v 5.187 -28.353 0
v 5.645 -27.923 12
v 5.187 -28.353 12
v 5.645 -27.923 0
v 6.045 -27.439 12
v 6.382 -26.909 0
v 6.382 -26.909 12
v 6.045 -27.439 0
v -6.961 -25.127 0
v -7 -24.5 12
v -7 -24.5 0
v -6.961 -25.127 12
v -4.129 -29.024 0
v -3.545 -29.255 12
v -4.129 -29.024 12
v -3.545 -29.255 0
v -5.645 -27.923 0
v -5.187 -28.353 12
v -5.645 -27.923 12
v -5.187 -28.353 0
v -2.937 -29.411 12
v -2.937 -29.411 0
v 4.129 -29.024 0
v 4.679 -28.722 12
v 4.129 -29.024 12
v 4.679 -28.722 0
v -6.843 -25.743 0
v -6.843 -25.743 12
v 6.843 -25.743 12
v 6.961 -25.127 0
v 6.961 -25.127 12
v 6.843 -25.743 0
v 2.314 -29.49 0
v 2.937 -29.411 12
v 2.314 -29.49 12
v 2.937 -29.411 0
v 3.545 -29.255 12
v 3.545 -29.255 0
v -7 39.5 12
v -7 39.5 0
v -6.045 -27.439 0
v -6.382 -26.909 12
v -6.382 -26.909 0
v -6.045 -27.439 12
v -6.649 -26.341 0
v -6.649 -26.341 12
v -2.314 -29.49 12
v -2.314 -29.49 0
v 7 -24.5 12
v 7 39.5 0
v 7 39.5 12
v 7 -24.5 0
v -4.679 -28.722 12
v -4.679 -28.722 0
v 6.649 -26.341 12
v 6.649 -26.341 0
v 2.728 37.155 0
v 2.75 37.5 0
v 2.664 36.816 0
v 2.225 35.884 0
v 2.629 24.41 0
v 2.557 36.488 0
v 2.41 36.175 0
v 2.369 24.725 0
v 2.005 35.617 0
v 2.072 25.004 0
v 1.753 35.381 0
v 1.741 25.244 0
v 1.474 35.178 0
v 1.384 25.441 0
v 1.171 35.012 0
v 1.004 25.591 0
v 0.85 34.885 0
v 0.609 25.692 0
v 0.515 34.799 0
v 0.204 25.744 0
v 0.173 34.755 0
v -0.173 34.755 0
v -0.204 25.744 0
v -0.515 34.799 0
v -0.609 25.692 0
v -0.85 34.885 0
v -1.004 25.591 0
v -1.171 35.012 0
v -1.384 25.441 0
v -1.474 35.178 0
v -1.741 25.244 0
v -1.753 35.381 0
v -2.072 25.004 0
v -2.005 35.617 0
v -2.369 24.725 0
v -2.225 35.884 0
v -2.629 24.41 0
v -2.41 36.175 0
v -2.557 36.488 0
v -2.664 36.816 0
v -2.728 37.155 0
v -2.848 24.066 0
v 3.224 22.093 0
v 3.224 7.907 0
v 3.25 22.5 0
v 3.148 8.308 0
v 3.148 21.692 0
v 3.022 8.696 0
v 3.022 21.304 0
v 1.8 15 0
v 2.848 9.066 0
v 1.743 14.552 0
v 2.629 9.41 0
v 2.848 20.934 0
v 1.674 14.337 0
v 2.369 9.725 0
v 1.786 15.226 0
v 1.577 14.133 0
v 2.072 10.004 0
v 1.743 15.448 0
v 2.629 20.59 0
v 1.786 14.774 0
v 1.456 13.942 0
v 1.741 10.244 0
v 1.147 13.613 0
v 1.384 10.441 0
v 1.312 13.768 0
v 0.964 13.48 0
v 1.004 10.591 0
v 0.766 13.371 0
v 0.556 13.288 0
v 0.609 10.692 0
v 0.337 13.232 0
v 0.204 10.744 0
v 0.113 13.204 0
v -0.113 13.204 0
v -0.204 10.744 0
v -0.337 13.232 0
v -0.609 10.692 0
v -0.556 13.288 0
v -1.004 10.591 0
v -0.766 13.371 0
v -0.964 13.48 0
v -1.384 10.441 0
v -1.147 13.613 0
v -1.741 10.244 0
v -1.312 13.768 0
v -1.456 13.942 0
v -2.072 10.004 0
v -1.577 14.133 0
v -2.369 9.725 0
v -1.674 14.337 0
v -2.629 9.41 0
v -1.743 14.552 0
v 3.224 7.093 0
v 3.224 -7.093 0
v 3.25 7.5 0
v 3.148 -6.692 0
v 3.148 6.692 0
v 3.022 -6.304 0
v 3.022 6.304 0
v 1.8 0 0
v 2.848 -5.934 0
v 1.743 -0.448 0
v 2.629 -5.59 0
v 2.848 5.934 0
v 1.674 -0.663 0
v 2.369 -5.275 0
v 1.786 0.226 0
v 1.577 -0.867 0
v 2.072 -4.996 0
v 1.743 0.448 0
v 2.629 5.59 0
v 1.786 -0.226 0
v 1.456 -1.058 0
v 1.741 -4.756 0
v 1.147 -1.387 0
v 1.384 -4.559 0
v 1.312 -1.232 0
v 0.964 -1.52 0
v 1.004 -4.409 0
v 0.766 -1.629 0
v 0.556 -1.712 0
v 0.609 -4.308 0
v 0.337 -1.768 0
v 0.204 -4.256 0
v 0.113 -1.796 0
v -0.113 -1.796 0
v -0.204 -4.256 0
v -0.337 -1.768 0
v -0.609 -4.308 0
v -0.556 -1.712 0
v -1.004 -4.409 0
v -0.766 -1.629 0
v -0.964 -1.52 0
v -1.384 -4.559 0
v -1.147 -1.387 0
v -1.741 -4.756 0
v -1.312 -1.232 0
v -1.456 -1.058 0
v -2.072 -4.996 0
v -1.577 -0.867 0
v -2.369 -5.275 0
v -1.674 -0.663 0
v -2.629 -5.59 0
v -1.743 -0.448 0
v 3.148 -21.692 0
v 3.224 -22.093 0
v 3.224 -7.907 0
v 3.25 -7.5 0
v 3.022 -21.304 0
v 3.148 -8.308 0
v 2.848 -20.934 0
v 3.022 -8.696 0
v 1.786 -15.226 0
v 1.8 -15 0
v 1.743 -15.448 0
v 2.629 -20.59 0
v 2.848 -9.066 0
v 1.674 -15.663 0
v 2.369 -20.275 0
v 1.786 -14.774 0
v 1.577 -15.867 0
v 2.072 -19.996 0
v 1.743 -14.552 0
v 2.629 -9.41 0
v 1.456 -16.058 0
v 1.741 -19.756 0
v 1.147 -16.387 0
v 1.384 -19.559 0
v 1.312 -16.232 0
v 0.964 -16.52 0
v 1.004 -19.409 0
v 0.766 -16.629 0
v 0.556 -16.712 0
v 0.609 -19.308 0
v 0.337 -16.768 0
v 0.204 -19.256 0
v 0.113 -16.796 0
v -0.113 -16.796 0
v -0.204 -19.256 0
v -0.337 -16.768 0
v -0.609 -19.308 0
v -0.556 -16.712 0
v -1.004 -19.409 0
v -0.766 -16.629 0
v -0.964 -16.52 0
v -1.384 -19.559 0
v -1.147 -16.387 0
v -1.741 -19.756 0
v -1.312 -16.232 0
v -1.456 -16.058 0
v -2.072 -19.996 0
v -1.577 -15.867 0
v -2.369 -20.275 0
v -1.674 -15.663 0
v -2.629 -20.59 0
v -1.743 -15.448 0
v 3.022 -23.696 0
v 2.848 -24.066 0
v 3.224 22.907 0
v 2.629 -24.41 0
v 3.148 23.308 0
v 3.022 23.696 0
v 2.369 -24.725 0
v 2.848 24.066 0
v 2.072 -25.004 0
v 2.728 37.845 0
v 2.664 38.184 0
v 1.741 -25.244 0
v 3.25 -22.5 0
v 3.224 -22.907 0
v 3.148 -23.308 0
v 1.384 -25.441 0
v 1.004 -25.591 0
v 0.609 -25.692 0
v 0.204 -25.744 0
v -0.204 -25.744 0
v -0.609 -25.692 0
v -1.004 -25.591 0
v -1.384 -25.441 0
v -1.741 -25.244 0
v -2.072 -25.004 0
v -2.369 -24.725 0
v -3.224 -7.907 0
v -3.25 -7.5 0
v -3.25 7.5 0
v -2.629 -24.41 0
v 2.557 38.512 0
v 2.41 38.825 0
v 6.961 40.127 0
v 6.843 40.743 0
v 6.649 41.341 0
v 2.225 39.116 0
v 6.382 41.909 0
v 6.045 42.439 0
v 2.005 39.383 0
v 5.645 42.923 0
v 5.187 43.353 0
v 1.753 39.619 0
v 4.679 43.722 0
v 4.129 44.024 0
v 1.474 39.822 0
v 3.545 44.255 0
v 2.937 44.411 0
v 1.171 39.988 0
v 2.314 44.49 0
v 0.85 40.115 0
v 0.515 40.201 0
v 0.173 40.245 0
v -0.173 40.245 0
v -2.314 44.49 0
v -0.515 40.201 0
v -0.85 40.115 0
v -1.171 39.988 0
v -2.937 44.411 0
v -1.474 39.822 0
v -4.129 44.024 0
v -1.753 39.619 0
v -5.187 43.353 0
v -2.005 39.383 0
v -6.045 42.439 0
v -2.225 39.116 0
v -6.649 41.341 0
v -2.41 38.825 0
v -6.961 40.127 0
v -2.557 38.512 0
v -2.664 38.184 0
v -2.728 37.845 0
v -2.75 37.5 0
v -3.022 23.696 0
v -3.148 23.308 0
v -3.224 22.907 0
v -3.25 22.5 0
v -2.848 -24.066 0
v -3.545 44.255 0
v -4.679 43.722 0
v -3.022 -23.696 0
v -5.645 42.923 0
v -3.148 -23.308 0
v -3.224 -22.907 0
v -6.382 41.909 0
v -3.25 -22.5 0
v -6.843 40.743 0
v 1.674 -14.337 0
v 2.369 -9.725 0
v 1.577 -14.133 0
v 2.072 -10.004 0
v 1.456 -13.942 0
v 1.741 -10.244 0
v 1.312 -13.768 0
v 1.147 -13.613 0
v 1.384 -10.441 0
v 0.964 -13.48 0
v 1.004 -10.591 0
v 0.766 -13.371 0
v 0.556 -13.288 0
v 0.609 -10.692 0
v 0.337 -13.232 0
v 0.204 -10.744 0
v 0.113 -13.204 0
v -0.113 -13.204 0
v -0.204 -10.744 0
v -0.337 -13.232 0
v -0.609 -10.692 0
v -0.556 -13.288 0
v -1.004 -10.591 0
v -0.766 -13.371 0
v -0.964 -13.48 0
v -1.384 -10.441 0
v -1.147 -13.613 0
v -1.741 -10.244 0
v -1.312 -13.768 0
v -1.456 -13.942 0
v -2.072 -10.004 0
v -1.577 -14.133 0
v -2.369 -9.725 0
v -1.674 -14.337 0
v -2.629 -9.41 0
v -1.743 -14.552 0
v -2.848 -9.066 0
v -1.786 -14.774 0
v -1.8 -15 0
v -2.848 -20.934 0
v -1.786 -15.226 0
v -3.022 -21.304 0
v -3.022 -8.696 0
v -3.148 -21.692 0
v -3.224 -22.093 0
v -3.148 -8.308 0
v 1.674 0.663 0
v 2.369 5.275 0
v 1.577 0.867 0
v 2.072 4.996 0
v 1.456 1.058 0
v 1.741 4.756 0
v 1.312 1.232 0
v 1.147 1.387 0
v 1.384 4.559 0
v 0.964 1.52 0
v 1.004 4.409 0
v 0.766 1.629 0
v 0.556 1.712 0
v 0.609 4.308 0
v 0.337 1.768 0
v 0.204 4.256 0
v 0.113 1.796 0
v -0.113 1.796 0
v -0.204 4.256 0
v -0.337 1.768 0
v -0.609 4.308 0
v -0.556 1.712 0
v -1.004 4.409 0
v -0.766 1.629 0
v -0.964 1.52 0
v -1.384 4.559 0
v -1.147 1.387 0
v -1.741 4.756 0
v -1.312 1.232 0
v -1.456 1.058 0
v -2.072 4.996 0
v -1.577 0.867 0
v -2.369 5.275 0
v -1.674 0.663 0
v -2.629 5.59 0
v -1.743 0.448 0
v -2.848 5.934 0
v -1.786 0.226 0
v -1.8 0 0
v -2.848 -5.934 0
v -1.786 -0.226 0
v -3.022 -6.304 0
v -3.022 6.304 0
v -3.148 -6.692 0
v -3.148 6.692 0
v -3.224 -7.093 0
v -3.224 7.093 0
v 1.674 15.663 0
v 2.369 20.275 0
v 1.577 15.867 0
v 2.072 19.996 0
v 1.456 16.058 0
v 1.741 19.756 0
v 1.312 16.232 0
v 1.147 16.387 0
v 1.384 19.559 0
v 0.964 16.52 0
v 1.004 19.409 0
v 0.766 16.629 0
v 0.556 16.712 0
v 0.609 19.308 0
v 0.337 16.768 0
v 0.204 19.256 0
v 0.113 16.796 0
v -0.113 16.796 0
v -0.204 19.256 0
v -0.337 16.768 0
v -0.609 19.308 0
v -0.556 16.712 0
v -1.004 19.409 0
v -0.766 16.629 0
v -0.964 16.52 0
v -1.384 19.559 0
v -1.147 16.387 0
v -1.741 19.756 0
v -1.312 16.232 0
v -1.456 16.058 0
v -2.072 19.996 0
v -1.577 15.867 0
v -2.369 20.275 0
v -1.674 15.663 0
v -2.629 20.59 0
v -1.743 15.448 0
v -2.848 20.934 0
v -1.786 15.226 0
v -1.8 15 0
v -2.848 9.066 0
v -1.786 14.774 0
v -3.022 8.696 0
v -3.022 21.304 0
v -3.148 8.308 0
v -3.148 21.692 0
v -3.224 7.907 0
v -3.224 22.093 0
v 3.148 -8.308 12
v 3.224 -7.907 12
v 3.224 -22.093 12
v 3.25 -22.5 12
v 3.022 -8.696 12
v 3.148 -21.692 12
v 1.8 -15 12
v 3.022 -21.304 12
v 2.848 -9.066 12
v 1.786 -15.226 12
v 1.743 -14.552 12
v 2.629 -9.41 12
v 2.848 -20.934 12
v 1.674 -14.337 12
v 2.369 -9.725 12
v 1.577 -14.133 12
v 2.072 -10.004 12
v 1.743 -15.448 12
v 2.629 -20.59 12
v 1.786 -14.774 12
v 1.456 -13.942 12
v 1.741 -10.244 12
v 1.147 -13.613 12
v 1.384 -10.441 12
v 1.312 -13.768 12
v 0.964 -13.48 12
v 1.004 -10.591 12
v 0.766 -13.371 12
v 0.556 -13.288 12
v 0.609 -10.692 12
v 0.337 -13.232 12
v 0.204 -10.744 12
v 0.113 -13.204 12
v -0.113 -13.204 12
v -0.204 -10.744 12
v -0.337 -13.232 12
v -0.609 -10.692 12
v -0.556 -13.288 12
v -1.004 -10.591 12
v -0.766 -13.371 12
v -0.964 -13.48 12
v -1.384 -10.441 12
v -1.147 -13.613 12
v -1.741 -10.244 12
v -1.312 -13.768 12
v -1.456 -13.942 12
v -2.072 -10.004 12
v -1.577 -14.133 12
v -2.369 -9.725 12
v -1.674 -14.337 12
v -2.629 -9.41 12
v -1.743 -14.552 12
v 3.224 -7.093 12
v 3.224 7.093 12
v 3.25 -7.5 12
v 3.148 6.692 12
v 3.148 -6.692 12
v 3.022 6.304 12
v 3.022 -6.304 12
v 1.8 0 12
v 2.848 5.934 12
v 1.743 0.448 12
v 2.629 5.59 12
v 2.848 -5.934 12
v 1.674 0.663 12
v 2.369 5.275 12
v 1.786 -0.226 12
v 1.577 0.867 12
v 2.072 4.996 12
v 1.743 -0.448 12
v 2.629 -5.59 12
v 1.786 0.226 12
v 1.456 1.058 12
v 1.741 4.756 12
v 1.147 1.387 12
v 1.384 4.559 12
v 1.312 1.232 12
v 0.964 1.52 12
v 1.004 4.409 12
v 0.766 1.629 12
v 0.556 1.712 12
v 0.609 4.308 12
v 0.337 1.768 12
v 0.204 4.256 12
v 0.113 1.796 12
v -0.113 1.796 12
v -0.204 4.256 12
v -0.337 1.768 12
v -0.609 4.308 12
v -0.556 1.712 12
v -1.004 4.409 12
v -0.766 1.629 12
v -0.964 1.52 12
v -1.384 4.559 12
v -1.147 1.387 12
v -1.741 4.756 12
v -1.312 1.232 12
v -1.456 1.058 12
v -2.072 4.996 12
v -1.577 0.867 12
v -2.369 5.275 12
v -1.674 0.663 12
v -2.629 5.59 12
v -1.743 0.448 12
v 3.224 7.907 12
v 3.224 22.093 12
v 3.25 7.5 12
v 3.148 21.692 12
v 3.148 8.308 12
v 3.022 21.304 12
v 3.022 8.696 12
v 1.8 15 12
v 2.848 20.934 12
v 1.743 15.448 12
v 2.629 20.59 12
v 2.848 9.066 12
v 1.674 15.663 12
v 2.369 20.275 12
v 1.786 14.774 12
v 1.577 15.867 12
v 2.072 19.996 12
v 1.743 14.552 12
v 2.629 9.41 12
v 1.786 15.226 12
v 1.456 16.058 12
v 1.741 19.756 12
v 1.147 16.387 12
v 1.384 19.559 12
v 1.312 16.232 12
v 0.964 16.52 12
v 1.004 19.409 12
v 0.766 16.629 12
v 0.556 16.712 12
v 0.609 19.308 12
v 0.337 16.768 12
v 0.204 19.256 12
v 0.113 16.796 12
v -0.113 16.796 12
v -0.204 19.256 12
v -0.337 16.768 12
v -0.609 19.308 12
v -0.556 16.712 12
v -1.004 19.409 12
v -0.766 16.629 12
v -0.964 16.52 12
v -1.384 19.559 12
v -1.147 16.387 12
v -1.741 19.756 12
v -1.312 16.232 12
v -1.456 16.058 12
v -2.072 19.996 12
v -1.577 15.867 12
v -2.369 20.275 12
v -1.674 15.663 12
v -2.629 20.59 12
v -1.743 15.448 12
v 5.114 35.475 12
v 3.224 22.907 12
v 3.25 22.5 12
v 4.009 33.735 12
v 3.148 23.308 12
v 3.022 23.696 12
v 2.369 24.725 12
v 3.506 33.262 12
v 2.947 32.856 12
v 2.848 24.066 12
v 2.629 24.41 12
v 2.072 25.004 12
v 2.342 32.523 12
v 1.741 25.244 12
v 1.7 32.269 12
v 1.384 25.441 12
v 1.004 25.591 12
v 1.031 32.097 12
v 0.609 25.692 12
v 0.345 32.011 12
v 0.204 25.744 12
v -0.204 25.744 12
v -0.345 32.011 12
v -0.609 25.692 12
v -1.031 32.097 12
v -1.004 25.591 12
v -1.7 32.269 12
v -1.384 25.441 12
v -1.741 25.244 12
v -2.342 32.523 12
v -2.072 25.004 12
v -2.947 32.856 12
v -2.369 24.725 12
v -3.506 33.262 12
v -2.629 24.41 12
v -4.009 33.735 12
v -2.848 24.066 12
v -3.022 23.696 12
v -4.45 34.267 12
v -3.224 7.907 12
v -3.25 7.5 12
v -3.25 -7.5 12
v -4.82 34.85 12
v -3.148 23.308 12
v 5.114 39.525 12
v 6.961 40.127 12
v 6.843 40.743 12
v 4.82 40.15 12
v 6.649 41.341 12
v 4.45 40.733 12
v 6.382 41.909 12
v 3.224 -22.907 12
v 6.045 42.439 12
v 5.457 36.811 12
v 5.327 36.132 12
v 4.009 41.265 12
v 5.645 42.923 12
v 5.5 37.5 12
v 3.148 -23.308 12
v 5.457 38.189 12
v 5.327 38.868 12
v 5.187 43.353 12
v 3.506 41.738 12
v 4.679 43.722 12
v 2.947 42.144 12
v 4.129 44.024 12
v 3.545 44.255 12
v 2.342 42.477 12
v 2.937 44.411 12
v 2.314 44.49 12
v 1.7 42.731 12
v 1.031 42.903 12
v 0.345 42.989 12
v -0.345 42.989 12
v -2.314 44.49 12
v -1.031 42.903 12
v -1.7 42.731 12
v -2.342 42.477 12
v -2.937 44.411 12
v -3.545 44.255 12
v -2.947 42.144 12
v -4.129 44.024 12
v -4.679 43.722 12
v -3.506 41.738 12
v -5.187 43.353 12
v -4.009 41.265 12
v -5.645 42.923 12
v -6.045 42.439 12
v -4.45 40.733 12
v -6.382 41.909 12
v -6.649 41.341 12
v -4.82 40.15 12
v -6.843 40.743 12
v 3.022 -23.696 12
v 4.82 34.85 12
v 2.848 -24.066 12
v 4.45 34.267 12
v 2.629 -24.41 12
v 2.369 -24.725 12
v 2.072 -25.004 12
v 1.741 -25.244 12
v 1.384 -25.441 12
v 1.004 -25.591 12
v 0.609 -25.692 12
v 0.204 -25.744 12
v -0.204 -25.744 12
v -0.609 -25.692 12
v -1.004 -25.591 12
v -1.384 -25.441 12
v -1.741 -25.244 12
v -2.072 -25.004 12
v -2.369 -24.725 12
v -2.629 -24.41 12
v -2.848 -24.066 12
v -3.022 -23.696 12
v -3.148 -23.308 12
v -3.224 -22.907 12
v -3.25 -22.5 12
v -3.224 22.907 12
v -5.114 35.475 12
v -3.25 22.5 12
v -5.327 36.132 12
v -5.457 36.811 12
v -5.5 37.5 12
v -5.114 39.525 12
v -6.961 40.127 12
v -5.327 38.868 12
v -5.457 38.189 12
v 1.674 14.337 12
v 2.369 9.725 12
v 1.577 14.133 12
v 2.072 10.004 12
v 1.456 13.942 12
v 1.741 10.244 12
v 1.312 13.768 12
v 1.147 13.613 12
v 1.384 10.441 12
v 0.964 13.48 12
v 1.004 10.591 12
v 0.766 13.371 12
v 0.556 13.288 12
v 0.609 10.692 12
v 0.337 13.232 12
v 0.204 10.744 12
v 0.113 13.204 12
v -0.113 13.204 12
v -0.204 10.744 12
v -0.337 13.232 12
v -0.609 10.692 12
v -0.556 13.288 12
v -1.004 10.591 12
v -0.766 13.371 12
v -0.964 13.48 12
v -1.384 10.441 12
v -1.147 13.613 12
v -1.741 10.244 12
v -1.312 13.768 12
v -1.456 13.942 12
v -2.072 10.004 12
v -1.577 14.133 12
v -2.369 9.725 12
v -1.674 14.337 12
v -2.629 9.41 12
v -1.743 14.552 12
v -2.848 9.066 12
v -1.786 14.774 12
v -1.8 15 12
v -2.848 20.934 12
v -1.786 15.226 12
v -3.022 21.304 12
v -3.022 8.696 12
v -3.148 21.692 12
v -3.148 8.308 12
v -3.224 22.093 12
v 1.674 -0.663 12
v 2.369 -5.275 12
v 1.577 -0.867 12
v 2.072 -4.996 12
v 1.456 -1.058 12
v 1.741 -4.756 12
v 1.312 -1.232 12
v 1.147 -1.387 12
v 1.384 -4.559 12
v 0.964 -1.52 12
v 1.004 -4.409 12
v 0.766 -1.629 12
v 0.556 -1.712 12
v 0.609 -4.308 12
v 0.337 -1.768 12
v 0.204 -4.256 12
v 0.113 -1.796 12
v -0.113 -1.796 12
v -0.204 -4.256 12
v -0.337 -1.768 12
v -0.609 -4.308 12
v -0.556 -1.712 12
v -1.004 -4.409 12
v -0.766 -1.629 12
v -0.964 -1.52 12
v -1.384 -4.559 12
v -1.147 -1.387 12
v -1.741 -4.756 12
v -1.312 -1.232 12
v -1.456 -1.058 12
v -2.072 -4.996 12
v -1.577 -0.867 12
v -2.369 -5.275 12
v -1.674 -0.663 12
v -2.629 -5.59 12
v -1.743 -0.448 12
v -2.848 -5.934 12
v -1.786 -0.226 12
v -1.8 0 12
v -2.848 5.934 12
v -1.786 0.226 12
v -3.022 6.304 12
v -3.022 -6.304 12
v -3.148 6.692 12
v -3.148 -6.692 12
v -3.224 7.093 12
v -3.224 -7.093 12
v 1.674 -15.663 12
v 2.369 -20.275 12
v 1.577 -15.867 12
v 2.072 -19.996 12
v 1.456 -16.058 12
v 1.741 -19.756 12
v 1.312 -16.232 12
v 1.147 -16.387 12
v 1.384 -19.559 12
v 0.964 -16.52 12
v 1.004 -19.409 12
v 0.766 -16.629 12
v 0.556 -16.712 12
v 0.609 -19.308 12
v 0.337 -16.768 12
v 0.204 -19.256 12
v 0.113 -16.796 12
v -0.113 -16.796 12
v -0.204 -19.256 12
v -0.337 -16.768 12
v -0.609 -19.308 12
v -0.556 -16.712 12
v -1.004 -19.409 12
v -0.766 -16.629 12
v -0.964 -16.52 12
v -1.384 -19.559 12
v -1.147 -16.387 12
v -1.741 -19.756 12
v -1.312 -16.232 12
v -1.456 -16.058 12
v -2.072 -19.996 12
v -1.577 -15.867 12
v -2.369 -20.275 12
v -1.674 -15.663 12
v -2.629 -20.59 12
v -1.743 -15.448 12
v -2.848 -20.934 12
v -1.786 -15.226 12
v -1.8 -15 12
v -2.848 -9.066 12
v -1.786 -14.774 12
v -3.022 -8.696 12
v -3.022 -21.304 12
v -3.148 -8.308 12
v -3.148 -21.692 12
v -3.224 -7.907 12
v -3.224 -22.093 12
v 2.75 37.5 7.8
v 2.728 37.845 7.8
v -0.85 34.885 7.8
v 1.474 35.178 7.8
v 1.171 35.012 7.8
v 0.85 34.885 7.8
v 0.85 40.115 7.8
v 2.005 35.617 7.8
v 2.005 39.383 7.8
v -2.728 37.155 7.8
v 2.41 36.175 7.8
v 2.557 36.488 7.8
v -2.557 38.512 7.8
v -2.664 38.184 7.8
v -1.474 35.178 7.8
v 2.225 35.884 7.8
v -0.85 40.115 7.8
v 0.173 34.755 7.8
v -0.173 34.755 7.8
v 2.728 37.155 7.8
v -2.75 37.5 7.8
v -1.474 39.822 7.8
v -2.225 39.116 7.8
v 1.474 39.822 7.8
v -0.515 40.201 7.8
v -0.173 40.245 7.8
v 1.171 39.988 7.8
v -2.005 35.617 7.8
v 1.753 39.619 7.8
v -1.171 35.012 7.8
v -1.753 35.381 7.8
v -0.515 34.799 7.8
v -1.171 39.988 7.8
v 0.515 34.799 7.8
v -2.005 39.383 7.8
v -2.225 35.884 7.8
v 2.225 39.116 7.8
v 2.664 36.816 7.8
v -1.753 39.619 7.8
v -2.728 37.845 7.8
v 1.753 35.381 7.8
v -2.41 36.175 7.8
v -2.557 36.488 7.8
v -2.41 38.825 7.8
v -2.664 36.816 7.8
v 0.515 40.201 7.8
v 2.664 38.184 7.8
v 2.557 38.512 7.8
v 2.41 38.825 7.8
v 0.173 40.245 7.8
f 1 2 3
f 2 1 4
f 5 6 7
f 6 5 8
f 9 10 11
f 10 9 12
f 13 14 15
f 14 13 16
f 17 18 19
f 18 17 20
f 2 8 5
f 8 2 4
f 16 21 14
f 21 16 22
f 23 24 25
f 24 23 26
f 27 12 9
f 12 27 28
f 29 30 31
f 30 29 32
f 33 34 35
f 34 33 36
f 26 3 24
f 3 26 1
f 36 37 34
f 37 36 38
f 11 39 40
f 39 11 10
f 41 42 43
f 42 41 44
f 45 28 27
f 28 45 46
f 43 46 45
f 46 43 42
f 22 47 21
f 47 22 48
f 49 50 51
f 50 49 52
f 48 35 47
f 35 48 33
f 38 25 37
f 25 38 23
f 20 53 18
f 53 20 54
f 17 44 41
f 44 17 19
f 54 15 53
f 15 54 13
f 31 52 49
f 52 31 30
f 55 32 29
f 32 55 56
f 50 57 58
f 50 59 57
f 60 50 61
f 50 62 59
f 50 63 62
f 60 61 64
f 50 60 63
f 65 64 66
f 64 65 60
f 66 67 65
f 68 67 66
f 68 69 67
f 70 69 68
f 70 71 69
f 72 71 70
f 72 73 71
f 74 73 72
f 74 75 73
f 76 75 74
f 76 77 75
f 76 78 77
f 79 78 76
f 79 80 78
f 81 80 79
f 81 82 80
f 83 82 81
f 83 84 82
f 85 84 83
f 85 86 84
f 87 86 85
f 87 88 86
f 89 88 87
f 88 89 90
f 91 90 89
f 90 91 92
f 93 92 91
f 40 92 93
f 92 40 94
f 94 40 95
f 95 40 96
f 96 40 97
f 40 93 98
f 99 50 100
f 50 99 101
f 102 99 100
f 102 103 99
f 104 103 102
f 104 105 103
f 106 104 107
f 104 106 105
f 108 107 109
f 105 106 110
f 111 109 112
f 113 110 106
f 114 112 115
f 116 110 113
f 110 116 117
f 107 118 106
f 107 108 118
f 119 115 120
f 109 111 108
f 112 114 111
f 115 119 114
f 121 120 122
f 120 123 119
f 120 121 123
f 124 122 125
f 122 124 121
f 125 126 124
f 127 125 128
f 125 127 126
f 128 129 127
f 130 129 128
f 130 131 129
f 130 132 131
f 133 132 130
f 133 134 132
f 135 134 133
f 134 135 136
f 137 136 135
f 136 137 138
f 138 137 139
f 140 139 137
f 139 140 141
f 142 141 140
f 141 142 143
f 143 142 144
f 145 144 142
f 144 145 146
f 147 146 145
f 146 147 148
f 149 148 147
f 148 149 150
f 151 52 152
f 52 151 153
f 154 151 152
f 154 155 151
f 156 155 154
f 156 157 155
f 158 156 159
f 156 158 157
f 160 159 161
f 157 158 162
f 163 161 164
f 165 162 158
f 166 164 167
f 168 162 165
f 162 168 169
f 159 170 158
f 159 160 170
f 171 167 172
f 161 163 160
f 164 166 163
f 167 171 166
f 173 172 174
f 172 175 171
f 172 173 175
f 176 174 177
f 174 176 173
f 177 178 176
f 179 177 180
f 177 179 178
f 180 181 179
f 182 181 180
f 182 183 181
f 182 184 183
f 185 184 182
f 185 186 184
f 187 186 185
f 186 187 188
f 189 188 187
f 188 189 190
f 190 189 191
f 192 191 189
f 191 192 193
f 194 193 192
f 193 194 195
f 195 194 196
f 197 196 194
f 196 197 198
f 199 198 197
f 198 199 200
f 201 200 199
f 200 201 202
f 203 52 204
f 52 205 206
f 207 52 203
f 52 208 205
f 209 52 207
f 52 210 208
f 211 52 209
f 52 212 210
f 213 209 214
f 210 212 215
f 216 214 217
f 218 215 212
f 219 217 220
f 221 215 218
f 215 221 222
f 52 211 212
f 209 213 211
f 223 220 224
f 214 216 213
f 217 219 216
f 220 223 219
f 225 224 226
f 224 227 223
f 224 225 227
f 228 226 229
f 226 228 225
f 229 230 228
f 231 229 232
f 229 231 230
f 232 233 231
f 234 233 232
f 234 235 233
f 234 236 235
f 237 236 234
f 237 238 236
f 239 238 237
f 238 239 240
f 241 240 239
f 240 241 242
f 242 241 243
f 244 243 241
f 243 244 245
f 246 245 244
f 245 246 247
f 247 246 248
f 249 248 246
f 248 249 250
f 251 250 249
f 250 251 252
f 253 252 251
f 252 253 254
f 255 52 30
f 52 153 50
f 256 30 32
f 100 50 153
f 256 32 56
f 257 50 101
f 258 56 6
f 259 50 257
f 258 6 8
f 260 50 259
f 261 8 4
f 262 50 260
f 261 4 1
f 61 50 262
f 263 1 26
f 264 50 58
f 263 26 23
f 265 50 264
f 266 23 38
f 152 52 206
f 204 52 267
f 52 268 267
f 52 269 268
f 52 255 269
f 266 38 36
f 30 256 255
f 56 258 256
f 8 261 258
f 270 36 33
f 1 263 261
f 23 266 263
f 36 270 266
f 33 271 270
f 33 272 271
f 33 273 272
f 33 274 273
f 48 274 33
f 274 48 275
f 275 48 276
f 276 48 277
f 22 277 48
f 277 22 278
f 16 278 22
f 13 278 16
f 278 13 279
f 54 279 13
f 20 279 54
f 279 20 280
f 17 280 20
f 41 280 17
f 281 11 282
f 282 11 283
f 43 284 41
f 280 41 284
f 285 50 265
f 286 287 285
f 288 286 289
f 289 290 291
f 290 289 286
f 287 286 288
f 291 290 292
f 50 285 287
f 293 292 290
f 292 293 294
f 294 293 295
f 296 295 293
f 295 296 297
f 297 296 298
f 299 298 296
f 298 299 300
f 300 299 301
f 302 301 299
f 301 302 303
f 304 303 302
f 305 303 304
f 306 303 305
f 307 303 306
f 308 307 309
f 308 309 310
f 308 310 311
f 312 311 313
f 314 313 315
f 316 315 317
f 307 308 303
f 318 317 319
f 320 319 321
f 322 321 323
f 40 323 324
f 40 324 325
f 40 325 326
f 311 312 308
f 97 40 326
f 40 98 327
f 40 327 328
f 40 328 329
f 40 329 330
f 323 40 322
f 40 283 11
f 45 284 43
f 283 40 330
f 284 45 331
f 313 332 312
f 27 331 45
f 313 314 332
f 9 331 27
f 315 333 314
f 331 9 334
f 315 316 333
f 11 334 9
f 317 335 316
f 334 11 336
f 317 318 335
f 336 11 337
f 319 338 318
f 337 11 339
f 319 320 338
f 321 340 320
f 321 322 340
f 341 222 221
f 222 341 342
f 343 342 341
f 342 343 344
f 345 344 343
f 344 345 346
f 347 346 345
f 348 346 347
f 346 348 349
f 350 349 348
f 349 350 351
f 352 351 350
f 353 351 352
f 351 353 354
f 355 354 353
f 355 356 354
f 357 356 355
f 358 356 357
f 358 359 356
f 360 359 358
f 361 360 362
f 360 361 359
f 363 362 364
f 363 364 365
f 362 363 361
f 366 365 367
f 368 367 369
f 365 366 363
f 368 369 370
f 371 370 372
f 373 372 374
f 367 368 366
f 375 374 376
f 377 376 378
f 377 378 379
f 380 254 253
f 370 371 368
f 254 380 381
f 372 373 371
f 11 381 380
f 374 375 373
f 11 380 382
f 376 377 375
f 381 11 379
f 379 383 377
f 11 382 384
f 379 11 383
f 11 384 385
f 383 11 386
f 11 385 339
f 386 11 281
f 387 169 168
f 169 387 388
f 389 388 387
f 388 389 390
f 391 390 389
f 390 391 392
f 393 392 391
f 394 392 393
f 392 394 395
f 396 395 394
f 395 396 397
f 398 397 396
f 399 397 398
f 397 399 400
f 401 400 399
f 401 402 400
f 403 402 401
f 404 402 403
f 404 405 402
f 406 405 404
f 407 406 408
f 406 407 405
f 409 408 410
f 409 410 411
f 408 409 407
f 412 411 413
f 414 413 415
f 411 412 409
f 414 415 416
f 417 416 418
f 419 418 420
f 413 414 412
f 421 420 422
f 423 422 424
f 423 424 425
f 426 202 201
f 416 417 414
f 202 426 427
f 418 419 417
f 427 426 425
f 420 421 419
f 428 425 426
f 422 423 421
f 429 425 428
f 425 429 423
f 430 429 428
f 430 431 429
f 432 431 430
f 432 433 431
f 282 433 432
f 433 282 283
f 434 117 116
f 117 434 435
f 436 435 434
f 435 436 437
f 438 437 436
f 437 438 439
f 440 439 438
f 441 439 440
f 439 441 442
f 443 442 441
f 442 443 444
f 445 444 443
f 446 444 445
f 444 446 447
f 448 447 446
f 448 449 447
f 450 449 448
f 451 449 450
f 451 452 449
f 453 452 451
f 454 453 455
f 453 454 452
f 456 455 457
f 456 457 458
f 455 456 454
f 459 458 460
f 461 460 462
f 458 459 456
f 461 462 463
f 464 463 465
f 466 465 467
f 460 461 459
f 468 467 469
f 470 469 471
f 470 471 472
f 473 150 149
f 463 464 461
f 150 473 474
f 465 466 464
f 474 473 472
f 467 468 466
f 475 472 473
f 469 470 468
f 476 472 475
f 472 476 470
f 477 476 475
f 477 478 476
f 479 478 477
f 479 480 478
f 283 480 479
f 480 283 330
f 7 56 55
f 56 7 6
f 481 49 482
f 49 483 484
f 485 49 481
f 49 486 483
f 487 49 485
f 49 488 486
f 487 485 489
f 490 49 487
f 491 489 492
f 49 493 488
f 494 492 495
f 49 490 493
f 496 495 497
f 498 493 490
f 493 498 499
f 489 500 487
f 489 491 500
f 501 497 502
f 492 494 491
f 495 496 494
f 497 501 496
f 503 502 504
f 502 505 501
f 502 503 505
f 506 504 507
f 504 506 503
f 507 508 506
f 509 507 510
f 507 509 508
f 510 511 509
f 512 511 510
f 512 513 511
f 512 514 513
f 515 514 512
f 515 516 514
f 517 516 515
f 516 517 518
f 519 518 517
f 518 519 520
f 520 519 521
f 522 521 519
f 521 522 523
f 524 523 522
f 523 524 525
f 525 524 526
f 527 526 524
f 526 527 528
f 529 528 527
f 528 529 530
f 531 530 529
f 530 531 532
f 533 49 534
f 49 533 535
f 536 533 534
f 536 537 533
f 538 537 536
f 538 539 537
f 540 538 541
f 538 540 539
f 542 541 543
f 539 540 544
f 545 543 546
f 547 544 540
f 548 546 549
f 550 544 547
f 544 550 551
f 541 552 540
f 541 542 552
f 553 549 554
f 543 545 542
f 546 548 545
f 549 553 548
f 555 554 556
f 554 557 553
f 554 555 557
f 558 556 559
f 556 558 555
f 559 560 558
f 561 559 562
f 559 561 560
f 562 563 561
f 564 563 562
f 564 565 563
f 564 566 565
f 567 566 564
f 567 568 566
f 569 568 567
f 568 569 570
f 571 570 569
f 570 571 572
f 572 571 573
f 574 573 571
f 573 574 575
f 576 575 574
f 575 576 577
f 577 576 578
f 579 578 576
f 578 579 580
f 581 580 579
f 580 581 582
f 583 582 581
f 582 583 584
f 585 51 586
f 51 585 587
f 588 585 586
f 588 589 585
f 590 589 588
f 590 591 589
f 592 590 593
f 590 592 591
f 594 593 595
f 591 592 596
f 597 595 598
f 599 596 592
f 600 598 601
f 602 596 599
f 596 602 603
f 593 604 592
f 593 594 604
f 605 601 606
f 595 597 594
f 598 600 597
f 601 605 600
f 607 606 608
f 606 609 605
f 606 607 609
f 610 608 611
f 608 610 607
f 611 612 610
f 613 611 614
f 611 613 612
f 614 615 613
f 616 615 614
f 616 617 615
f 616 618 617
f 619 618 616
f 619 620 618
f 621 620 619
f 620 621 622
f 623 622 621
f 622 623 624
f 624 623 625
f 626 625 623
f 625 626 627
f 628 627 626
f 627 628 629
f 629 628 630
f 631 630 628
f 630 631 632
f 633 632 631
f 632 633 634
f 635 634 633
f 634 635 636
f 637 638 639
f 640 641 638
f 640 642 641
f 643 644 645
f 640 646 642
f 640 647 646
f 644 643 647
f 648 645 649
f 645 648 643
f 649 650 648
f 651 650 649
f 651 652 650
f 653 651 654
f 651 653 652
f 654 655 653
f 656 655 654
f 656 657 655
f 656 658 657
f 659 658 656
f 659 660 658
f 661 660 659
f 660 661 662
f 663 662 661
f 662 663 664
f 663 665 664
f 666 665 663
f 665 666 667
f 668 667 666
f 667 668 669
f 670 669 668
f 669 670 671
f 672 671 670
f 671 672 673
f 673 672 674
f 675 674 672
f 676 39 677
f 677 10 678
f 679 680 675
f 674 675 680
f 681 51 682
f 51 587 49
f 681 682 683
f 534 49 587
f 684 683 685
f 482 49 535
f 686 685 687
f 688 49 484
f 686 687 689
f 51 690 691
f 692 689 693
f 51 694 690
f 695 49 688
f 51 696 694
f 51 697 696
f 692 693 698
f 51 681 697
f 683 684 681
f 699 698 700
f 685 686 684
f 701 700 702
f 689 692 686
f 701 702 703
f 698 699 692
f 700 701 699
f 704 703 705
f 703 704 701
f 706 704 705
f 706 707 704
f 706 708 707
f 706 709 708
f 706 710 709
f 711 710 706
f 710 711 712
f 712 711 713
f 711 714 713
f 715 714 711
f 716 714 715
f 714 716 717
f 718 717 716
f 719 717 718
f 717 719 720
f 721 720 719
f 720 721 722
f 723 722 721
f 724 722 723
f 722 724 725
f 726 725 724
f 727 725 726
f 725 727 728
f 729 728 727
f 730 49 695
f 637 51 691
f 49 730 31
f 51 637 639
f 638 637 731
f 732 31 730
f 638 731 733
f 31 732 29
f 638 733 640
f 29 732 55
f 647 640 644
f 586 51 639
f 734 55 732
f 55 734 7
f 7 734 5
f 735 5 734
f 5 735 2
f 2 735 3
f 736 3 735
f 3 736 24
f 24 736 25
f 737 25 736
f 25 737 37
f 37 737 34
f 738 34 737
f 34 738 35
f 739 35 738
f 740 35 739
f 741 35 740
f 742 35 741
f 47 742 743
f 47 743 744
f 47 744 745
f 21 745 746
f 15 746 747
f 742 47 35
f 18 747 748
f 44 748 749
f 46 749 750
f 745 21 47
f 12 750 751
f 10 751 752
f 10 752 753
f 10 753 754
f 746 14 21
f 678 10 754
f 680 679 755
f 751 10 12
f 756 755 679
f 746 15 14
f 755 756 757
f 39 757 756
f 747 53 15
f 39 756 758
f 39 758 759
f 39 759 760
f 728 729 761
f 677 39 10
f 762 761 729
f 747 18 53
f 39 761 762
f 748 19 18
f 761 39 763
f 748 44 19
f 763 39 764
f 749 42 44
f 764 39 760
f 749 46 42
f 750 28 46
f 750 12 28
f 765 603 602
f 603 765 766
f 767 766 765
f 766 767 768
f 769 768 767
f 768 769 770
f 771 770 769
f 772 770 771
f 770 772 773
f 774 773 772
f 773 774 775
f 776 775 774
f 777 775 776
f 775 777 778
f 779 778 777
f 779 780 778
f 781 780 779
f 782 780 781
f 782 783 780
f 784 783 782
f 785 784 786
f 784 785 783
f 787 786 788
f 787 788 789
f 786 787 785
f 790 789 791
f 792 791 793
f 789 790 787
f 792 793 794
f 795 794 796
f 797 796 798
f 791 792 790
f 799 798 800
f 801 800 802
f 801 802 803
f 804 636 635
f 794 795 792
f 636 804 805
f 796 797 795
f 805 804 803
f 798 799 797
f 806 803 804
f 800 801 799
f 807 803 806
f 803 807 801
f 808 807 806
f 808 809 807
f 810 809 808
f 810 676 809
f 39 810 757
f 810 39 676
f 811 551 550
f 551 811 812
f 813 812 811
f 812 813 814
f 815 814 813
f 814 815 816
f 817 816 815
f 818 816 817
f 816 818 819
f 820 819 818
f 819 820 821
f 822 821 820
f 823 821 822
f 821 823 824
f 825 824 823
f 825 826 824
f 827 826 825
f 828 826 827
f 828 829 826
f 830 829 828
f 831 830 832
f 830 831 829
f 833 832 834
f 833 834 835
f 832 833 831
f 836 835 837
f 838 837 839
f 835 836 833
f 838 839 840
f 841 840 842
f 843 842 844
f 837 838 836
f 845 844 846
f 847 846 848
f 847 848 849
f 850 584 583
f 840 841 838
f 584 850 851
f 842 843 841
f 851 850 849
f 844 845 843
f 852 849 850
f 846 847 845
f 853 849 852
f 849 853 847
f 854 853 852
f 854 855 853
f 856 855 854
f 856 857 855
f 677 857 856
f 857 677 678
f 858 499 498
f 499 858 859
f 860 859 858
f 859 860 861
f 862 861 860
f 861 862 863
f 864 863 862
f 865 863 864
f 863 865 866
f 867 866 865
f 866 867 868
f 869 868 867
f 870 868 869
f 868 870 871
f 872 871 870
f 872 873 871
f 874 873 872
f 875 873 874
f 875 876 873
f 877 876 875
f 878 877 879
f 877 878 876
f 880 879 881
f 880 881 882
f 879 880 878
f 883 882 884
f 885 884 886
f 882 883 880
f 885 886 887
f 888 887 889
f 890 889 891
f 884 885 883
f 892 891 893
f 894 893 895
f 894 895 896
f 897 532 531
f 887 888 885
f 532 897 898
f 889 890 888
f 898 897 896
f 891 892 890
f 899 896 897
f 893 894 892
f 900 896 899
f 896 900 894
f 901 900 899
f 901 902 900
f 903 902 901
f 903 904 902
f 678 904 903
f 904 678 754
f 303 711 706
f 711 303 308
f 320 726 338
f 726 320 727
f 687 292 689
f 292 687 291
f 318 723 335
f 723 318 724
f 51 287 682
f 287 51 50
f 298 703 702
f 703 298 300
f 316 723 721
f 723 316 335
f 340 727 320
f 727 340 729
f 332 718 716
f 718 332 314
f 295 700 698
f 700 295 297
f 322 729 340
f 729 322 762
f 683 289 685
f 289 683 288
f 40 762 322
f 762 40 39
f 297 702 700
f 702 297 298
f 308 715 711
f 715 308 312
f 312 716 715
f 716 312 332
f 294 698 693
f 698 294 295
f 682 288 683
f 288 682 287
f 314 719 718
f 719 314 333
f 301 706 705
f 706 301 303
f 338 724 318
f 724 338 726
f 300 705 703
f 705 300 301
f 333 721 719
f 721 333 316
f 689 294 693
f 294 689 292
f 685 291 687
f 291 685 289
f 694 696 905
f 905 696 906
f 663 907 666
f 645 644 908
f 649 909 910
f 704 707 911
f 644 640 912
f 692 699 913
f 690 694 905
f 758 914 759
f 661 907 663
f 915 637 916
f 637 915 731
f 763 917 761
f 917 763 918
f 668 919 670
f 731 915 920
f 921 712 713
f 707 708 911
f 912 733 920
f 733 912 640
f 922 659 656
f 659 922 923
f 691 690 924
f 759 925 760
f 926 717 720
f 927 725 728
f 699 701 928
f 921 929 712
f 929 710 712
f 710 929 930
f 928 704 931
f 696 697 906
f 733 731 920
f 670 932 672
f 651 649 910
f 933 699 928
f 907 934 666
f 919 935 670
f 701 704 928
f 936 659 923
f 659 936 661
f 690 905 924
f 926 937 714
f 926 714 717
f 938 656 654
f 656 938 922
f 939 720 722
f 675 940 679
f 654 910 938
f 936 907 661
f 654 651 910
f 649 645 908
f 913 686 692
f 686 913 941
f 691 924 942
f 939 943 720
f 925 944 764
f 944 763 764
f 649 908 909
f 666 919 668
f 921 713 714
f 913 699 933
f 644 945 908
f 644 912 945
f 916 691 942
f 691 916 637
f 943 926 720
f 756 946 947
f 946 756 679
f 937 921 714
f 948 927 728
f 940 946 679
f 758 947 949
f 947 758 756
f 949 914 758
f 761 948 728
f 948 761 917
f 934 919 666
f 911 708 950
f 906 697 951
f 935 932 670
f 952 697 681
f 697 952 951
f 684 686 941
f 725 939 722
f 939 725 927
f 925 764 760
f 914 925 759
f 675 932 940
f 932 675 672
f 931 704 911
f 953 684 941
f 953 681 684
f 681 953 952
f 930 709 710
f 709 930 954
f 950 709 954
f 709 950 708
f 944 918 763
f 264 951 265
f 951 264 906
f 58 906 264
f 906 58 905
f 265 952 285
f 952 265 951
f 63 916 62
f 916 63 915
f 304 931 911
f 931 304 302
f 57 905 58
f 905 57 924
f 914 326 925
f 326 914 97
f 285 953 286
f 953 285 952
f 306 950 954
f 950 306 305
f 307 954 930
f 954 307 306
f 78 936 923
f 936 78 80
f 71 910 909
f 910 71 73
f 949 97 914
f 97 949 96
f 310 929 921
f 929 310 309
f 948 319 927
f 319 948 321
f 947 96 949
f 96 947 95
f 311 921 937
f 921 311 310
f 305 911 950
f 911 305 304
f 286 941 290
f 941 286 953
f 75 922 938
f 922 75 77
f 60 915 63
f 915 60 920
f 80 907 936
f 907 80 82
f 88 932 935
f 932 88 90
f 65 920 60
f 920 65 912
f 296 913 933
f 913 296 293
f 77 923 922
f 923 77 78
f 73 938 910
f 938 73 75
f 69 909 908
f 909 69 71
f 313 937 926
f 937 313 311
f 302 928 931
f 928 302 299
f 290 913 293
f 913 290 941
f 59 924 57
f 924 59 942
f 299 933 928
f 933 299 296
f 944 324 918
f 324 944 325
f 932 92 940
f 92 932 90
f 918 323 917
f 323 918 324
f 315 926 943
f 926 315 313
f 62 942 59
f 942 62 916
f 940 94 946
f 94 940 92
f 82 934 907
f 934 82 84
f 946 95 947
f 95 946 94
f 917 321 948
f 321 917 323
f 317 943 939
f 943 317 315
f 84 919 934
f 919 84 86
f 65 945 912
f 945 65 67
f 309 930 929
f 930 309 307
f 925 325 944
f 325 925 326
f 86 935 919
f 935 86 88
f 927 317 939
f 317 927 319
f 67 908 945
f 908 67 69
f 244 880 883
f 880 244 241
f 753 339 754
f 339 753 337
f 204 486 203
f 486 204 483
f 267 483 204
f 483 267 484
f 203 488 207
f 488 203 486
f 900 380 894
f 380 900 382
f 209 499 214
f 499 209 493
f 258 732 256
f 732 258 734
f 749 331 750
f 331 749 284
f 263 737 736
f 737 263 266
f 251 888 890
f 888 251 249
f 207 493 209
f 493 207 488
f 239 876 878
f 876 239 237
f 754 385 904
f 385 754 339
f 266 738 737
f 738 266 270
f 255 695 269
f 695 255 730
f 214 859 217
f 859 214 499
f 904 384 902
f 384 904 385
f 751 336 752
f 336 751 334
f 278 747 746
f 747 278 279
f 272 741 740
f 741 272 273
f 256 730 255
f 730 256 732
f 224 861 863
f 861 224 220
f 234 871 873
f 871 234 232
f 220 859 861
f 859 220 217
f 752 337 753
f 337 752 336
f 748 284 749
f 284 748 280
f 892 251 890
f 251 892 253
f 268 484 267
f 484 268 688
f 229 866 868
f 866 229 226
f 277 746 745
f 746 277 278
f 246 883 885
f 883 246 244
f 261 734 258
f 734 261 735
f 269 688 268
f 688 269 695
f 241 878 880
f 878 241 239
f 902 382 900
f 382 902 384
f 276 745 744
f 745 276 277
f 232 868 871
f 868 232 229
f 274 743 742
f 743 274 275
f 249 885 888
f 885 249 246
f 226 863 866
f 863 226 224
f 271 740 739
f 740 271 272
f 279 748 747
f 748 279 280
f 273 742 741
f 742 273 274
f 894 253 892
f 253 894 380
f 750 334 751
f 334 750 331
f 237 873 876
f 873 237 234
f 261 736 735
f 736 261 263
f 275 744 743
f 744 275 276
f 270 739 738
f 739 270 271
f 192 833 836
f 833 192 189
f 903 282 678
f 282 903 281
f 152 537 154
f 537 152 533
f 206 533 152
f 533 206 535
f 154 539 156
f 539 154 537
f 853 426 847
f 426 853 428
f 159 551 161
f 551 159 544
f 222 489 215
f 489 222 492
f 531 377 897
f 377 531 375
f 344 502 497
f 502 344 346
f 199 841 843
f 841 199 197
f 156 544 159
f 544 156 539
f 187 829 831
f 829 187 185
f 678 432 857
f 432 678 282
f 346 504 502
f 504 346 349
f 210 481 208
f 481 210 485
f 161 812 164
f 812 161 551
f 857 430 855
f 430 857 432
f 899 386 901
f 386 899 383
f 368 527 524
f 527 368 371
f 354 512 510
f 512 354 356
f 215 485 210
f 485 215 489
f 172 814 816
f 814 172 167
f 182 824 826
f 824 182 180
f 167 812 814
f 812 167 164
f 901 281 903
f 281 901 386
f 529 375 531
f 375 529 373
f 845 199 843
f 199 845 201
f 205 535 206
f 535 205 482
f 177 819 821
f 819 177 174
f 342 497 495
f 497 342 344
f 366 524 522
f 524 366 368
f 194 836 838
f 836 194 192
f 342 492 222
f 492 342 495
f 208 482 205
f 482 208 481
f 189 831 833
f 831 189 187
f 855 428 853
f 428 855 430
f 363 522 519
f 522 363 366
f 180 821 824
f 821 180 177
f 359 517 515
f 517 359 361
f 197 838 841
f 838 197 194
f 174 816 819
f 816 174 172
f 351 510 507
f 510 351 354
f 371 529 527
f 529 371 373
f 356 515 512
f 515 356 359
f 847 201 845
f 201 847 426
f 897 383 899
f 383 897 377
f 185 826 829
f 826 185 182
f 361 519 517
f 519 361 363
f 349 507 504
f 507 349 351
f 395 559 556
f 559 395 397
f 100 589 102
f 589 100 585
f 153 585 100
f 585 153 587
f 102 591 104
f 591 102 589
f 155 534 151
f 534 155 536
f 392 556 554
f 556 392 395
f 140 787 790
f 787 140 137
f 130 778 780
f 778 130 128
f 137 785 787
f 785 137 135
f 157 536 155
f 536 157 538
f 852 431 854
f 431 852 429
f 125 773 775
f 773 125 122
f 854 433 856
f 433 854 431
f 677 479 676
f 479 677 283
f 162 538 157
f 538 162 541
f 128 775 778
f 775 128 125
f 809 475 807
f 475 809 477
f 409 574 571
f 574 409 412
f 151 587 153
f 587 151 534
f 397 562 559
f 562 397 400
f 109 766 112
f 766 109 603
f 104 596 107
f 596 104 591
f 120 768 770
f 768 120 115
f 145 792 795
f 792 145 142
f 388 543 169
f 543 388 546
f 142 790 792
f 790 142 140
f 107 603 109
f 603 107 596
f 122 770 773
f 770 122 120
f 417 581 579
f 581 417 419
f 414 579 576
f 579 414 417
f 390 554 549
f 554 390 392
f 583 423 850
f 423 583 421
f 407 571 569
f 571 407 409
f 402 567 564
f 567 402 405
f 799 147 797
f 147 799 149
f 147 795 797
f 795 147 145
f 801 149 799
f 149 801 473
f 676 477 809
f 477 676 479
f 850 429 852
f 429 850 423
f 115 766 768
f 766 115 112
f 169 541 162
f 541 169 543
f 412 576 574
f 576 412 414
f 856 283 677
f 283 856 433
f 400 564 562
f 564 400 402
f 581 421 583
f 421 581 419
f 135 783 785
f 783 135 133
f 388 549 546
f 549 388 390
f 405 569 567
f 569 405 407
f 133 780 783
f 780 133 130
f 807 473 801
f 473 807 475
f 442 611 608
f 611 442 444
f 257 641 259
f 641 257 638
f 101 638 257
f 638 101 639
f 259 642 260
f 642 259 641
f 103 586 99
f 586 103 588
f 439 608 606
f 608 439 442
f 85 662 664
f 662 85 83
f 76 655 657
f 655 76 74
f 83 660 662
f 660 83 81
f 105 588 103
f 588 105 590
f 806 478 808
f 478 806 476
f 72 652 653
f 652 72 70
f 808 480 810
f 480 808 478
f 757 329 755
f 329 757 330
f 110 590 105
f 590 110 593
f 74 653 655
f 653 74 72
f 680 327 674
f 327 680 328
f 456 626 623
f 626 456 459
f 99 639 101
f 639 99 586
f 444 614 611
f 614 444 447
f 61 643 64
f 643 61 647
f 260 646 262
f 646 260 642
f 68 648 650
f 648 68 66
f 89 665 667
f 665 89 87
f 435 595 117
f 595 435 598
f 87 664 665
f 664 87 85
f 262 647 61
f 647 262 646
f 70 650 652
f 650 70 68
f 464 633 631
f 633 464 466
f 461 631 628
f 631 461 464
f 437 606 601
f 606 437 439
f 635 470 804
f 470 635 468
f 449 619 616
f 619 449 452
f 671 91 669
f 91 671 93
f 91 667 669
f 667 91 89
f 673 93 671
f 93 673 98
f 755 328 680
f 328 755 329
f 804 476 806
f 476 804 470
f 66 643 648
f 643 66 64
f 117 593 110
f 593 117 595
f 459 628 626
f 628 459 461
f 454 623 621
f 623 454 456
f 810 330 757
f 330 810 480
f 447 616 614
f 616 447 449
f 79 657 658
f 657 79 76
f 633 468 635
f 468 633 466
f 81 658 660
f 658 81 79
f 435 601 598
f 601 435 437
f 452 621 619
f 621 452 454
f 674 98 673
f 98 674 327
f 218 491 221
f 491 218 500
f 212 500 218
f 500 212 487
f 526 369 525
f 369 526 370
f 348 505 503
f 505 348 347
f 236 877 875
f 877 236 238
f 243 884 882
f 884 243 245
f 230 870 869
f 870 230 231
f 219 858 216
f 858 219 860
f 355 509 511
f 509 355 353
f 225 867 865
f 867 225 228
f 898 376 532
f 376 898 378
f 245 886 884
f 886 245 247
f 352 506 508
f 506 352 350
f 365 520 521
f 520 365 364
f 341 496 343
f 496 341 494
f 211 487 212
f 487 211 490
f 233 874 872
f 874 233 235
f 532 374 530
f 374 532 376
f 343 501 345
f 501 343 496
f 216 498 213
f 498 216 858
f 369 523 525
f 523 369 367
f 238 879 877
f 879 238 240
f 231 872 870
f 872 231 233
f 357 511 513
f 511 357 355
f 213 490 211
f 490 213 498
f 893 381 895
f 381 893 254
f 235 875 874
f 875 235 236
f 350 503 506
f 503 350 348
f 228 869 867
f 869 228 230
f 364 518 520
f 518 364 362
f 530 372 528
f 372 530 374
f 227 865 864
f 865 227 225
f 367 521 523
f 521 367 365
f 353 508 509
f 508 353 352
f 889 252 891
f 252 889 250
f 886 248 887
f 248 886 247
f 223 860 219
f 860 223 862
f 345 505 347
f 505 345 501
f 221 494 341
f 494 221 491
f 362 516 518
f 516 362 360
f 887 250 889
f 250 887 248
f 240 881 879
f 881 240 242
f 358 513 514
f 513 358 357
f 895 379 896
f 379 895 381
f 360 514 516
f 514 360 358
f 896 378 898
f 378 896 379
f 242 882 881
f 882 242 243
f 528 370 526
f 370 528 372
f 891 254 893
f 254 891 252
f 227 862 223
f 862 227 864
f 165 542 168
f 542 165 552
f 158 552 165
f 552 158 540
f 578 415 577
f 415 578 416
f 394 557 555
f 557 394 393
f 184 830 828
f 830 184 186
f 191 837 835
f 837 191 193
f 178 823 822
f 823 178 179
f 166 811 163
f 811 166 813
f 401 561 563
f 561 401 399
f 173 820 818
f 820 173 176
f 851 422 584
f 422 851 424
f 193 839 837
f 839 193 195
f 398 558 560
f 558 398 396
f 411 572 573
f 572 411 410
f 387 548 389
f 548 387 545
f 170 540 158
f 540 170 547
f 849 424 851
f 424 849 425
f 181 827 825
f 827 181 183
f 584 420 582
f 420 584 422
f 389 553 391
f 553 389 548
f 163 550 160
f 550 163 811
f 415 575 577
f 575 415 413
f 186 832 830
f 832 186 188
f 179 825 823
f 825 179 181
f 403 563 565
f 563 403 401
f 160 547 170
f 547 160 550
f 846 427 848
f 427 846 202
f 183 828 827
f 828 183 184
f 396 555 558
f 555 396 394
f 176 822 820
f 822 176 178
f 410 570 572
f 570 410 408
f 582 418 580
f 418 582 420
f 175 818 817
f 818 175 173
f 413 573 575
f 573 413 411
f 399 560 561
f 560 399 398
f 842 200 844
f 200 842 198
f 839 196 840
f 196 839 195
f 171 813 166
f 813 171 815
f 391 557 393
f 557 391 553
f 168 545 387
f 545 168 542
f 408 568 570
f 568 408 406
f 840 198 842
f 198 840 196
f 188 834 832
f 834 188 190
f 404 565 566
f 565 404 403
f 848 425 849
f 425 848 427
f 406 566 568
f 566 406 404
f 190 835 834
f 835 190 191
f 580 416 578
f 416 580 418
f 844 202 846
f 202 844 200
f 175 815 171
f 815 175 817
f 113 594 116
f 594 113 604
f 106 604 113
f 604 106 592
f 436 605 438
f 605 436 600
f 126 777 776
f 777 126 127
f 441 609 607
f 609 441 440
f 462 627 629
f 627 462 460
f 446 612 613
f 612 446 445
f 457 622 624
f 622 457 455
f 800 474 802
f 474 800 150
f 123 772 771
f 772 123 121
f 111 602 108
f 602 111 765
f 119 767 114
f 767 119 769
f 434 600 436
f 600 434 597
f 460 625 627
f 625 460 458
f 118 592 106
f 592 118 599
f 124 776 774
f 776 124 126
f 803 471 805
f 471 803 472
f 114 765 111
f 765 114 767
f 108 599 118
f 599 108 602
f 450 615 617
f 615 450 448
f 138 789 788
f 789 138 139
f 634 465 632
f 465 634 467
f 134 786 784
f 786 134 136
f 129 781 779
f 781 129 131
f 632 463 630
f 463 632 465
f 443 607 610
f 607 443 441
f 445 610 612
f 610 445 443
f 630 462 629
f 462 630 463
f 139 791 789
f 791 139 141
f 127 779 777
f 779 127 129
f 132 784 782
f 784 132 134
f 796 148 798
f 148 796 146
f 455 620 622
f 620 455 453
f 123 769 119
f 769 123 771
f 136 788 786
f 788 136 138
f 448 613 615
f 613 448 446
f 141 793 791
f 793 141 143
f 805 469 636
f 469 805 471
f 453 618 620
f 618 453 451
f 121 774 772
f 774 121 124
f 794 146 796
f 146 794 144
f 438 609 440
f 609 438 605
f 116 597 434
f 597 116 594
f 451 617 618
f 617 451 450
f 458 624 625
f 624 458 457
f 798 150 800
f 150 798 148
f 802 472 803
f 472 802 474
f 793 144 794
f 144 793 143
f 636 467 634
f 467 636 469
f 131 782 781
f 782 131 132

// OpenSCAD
$fn = 50;


difference() {
	union() {
		hull() {
			translate(v = [-2.0000000000, 24.5000000000, 0]) {
				cylinder(h = 12, r = 5);
			}
			translate(v = [2.0000000000, 24.5000000000, 0]) {
				cylinder(h = 12, r = 5);
			}
			translate(v = [-2.0000000000, -24.5000000000, 0]) {
				cylinder(h = 12, r = 5);
			}
			translate(v = [2.0000000000, -24.5000000000, 0]) {
				cylinder(h = 12, r = 5);
			}
		}
		translate(v = [0.0000000000, 30.0000000000, 0]) {
			hull() {
				translate(v = [-2.0000000000, 9.5000000000, 0]) {
					cylinder(h = 12, r = 5);
				}
				translate(v = [2.0000000000, 9.5000000000, 0]) {
					cylinder(h = 12, r = 5);
				}
				translate(v = [-2.0000000000, -9.5000000000, 0]) {
					cylinder(h = 12, r = 5);
				}
				translate(v = [2.0000000000, -9.5000000000, 0]) {
					cylinder(h = 12, r = 5);
				}
			}
		}
		translate(v = [0.0000000000, 30.0000000000, 0]) {
			hull() {
				translate(v = [-2.0000000000, 9.5000000000, 0]) {
					cylinder(h = 12, r = 5);
				}
				translate(v = [2.0000000000, 9.5000000000, 0]) {
					cylinder(h = 12, r = 5);
				}
				translate(v = [-2.0000000000, -9.5000000000, 0]) {
					cylinder(h = 12, r = 5);
				}
				translate(v = [2.0000000000, -9.5000000000, 0]) {
					cylinder(h = 12, r = 5);
				}
			}
		}
	}
	union() {
		translate(v = [0.0000000000, 37.5000000000, 12]) {
			rotate(a = [0, 0, 0]) {
				difference() {
					union() {
						#translate(v = [0, 0, -12.0000000000]) {
							cylinder(h = 12, r = 2.2500000000);
						}
						#translate(v = [0, 0, -4.2000000000]) {
							cylinder(h = 4.2000000000, r1 = 2.7500000000, r2 = 5.5000000000);
						}
						#translate(v = [0, 0, -12.0000000000]) {
							cylinder(h = 12, r = 2.7500000000);
						}
						#translate(v = [0, 0, -12.0000000000]) {
							cylinder(h = 12, r = 2.2500000000);
						}
					}
					union();
				}
			}
		}
		translate(v = [0.0000000000, 37.5000000000, 12]) {
			rotate(a = [0, 0, 0]) {
				difference() {
					union() {
						#translate(v = [0, 0, -12.0000000000]) {
							cylinder(h = 12, r = 2.2500000000);
						}
						#translate(v = [0, 0, -4.2000000000]) {
							cylinder(h = 4.2000000000, r1 = 2.7500000000, r2 = 5.5000000000);
						}
						#translate(v = [0, 0, -12.0000000000]) {
							cylinder(h = 12, r = 2.7500000000);
						}
						#translate(v = [0, 0, -12.0000000000]) {
							cylinder(h = 12, r = 2.2500000000);
						}
					}
					union();
				}
			}
		}
		translate(v = [0.0000000000, -22.5000000000, 0]) {
			translate(v = [0, 0, -100]) {
				cylinder(h = 200, r = 3.2500000000);
			}
		}
		translate(v = [0.0000000000, -7.5000000000, 0]) {
			translate(v = [0, 0, -100]) {
				cylinder(h = 200, r = 3.2500000000);
			}
		}
		translate(v = [0.0000000000, 7.5000000000, 0]) {
			translate(v = [0, 0, -100]) {
				cylinder(h = 200, r = 3.2500000000);
			}
		}
		translate(v = [0.0000000000, 22.5000000000, 0]) {
			translate(v = [0, 0, -100]) {
				cylinder(h = 200, r = 3.2500000000);
			}
		}
		translate(v = [0.0000000000, -22.5000000000, 0]) {
			translate(v = [0, 0, -100]) {
				cylinder(h = 200, r = 1.8000000000);
			}
		}
		translate(v = [0.0000000000, -15.0000000000, 0]) {
			translate(v = [0, 0, -100]) {
				cylinder(h = 200, r = 1.8000000000);
			}
		}
		translate(v = [0.0000000000, -7.5000000000, 0]) {
			translate(v = [0, 0, -100]) {
				cylinder(h = 200, r = 1.8000000000);
			}
		}
		translate(v = [0, 0, -100]) {
			cylinder(h = 200, r = 1.8000000000);
		}
		translate(v = [0.0000000000, 7.5000000000, 0]) {
			translate(v = [0, 0, -100]) {
				cylinder(h = 200, r = 1.8000000000);
			}
		}
		translate(v = [0.0000000000, 15.0000000000, 0]) {
			translate(v = [0, 0, -100]) {
				cylinder(h = 200, r = 1.8000000000);
			}
		}
		translate(v = [0.0000000000, 22.5000000000, 0]) {
			translate(v = [0, 0, -100]) {
				cylinder(h = 200, r = 1.8000000000);
			}
		}
	}
}
